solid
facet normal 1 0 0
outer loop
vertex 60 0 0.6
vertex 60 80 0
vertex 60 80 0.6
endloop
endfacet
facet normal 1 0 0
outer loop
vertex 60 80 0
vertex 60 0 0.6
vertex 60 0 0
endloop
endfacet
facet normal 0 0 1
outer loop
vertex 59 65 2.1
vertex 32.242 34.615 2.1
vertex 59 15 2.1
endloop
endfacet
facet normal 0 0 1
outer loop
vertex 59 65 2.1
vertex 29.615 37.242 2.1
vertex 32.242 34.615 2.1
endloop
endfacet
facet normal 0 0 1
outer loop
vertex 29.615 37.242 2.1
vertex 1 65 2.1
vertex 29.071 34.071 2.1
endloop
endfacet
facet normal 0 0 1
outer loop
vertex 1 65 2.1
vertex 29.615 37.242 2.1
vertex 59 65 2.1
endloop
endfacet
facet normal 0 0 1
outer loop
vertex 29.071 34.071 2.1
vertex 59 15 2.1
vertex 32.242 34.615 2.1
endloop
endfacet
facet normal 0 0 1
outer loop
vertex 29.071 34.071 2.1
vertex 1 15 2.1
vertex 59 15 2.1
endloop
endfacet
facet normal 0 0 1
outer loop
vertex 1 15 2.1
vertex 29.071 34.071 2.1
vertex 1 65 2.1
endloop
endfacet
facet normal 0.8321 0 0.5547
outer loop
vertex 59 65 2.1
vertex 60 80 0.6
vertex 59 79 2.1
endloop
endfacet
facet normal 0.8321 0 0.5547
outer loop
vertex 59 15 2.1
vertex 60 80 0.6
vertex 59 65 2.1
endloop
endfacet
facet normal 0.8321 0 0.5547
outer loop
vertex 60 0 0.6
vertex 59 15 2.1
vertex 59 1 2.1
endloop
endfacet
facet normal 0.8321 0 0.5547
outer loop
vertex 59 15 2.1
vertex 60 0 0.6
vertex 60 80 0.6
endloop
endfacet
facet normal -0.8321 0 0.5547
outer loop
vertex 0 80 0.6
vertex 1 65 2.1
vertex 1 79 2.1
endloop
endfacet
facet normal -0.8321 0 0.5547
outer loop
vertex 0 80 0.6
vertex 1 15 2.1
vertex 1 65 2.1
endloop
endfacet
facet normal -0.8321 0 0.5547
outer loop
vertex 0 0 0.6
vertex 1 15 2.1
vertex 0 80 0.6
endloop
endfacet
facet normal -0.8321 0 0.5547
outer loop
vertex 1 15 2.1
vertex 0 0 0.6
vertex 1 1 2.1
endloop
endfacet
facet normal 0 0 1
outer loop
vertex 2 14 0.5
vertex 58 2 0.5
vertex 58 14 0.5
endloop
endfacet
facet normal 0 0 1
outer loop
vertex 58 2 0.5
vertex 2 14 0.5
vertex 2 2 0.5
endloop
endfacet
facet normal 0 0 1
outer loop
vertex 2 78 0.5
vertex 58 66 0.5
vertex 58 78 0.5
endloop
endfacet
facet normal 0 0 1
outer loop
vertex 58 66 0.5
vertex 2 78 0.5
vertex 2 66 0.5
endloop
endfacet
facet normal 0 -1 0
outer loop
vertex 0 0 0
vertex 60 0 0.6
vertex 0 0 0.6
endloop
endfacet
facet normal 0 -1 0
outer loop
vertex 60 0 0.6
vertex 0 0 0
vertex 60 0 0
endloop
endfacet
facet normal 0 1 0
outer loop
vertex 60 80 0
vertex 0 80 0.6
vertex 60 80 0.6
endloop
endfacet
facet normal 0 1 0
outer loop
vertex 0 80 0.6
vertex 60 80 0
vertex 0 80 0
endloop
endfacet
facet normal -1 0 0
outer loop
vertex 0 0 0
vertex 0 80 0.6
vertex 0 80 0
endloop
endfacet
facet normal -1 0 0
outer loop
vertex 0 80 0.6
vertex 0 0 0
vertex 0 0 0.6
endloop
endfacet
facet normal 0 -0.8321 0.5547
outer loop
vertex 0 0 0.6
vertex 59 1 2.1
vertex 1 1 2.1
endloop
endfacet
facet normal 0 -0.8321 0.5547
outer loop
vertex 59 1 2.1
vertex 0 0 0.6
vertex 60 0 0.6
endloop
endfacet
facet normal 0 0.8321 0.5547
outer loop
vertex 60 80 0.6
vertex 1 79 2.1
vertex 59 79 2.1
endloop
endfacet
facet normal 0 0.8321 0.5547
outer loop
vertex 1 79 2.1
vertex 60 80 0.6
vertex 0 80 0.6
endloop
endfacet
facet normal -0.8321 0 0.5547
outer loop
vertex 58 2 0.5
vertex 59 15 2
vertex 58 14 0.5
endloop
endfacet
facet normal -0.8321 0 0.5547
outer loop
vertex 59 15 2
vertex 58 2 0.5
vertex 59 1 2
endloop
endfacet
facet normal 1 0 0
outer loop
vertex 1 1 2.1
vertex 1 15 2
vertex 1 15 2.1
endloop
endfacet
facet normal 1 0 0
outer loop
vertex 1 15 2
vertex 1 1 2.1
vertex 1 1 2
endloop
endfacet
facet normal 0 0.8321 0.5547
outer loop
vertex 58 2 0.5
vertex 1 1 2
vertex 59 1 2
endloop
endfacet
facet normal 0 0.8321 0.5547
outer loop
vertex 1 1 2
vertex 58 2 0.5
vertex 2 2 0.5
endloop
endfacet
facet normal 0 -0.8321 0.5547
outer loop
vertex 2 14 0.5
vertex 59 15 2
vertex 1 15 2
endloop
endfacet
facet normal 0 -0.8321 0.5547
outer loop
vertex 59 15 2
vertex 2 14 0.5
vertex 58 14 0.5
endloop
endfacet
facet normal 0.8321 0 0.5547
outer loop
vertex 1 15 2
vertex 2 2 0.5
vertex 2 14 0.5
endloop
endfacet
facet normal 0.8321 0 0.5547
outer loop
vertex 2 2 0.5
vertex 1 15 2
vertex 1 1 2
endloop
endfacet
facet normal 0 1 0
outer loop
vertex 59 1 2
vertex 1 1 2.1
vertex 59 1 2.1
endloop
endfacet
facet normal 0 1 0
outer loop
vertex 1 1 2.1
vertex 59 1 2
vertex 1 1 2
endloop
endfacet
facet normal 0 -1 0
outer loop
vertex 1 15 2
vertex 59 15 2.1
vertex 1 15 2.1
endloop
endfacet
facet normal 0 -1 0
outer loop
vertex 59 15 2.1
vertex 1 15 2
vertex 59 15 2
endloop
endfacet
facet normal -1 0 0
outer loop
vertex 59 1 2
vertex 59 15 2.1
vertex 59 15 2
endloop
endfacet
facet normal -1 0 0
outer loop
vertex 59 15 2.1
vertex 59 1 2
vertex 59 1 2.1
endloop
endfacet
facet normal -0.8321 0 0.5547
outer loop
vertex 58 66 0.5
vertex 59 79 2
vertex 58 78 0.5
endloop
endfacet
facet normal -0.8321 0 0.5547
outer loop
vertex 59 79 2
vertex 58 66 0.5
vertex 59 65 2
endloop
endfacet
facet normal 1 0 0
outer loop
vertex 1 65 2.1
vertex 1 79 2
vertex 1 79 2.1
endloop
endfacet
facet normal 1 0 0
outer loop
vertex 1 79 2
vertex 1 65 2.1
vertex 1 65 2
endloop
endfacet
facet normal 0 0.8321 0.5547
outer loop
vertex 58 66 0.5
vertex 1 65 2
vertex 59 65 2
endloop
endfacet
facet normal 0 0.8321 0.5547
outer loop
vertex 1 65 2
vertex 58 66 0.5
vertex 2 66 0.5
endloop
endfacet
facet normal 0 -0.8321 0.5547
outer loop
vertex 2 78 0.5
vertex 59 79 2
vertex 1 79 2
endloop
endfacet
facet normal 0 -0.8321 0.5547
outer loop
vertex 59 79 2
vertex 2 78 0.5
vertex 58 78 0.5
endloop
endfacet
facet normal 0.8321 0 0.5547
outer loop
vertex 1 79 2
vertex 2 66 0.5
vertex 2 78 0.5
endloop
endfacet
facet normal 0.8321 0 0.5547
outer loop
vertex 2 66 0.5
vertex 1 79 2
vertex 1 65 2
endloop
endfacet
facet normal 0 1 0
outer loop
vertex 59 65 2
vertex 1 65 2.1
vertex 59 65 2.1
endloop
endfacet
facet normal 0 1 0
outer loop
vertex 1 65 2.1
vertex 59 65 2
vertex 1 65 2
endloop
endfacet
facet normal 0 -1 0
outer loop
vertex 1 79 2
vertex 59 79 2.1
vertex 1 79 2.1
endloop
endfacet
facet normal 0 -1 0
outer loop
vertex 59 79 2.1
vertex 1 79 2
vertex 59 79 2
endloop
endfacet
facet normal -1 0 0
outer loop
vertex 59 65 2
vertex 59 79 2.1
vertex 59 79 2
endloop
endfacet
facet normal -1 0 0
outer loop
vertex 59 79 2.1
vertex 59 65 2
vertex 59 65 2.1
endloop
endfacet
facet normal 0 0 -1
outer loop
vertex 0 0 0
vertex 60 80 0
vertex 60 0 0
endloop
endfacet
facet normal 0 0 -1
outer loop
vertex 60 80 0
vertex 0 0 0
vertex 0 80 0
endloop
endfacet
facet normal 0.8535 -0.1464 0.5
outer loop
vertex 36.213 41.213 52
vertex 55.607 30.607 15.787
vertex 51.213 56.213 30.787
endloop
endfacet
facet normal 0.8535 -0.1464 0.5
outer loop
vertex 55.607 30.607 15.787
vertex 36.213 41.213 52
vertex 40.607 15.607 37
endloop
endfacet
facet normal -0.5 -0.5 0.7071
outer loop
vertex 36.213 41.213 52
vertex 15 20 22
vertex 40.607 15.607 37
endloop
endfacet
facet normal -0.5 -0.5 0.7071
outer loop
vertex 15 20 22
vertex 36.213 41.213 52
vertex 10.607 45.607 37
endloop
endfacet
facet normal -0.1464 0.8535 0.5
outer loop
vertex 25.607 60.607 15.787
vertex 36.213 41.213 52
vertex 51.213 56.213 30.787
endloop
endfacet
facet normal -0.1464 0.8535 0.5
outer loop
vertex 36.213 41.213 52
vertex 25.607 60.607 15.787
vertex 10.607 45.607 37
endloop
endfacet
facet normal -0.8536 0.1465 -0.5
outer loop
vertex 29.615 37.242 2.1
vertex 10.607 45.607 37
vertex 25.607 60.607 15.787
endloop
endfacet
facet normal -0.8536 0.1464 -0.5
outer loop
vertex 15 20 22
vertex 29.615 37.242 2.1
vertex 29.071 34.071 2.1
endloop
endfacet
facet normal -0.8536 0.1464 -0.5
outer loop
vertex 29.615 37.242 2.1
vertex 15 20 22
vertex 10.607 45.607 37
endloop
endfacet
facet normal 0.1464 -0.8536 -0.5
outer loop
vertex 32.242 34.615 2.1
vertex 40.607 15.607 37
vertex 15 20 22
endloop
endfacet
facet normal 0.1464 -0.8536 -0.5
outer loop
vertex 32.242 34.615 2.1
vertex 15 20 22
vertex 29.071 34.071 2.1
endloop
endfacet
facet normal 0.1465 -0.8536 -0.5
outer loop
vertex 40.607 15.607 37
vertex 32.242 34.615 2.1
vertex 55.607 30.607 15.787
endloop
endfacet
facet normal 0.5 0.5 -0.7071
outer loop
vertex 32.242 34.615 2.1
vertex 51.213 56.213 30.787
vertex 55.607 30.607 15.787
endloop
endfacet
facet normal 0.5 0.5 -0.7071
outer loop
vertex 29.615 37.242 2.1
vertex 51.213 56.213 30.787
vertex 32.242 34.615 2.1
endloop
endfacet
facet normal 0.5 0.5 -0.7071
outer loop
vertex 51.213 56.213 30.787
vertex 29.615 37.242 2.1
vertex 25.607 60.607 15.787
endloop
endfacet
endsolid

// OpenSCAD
echo(version=version());
// Base Config
base_W = 60; // Min Size < 10
base_H = 80; // Min Size < 40
base_T = 0.5; // Fix Size = 0.5 for Stapler
default_S = 12; // Fix Size = 12 for Stapler (Stapler size)
default_T = 2.0; // Fix Size = 2.0 for Stapler (base_T < default_T)
$fn = 60;

staple_base(base_T,base_W,base_H,default_S,default_T);

// Dummy object
# translate([base_W / 4, base_H / 4, 22]) rotate([45, 45, 45]) cube(base_W / 2);

module stapler_area(bt,bw,ds,dt) {
    hull() {
        translate([0, 0, dt - bt]) cube([bw - dt, ds + 2, 0.1]);
        translate([1, 1, 0]) cube([bw - dt * 2, ds, 0.1]);
    }
}

module staple_base(bt,bw,bh,ds,dt) {
    union() {
        // Base1(Bottom)
        cube([bw, bh, bt]);
        // Base2(Top)
        translate([0, 0, bt]) {
            difference() {
                // Base2_body
                hull() {
                    translate([1, 1, dt - bt]) cube([bw - 2, bh - 2, 0.1]);
                    translate([0, 0, 0]) cube([bw, bh, 0.1]);
                }
                // Base2_stapler_area1(Top)
                # translate([dt - 1, dt - 1, 0]) stapler_area(bt,bw,ds,dt);
                // Base2_stapler_area2(Bottom)
                # translate([dt - 1, bh - ds - dt - 1, 0]) stapler_area(bt,bw,ds,dt);
            }
        }
    }
}
